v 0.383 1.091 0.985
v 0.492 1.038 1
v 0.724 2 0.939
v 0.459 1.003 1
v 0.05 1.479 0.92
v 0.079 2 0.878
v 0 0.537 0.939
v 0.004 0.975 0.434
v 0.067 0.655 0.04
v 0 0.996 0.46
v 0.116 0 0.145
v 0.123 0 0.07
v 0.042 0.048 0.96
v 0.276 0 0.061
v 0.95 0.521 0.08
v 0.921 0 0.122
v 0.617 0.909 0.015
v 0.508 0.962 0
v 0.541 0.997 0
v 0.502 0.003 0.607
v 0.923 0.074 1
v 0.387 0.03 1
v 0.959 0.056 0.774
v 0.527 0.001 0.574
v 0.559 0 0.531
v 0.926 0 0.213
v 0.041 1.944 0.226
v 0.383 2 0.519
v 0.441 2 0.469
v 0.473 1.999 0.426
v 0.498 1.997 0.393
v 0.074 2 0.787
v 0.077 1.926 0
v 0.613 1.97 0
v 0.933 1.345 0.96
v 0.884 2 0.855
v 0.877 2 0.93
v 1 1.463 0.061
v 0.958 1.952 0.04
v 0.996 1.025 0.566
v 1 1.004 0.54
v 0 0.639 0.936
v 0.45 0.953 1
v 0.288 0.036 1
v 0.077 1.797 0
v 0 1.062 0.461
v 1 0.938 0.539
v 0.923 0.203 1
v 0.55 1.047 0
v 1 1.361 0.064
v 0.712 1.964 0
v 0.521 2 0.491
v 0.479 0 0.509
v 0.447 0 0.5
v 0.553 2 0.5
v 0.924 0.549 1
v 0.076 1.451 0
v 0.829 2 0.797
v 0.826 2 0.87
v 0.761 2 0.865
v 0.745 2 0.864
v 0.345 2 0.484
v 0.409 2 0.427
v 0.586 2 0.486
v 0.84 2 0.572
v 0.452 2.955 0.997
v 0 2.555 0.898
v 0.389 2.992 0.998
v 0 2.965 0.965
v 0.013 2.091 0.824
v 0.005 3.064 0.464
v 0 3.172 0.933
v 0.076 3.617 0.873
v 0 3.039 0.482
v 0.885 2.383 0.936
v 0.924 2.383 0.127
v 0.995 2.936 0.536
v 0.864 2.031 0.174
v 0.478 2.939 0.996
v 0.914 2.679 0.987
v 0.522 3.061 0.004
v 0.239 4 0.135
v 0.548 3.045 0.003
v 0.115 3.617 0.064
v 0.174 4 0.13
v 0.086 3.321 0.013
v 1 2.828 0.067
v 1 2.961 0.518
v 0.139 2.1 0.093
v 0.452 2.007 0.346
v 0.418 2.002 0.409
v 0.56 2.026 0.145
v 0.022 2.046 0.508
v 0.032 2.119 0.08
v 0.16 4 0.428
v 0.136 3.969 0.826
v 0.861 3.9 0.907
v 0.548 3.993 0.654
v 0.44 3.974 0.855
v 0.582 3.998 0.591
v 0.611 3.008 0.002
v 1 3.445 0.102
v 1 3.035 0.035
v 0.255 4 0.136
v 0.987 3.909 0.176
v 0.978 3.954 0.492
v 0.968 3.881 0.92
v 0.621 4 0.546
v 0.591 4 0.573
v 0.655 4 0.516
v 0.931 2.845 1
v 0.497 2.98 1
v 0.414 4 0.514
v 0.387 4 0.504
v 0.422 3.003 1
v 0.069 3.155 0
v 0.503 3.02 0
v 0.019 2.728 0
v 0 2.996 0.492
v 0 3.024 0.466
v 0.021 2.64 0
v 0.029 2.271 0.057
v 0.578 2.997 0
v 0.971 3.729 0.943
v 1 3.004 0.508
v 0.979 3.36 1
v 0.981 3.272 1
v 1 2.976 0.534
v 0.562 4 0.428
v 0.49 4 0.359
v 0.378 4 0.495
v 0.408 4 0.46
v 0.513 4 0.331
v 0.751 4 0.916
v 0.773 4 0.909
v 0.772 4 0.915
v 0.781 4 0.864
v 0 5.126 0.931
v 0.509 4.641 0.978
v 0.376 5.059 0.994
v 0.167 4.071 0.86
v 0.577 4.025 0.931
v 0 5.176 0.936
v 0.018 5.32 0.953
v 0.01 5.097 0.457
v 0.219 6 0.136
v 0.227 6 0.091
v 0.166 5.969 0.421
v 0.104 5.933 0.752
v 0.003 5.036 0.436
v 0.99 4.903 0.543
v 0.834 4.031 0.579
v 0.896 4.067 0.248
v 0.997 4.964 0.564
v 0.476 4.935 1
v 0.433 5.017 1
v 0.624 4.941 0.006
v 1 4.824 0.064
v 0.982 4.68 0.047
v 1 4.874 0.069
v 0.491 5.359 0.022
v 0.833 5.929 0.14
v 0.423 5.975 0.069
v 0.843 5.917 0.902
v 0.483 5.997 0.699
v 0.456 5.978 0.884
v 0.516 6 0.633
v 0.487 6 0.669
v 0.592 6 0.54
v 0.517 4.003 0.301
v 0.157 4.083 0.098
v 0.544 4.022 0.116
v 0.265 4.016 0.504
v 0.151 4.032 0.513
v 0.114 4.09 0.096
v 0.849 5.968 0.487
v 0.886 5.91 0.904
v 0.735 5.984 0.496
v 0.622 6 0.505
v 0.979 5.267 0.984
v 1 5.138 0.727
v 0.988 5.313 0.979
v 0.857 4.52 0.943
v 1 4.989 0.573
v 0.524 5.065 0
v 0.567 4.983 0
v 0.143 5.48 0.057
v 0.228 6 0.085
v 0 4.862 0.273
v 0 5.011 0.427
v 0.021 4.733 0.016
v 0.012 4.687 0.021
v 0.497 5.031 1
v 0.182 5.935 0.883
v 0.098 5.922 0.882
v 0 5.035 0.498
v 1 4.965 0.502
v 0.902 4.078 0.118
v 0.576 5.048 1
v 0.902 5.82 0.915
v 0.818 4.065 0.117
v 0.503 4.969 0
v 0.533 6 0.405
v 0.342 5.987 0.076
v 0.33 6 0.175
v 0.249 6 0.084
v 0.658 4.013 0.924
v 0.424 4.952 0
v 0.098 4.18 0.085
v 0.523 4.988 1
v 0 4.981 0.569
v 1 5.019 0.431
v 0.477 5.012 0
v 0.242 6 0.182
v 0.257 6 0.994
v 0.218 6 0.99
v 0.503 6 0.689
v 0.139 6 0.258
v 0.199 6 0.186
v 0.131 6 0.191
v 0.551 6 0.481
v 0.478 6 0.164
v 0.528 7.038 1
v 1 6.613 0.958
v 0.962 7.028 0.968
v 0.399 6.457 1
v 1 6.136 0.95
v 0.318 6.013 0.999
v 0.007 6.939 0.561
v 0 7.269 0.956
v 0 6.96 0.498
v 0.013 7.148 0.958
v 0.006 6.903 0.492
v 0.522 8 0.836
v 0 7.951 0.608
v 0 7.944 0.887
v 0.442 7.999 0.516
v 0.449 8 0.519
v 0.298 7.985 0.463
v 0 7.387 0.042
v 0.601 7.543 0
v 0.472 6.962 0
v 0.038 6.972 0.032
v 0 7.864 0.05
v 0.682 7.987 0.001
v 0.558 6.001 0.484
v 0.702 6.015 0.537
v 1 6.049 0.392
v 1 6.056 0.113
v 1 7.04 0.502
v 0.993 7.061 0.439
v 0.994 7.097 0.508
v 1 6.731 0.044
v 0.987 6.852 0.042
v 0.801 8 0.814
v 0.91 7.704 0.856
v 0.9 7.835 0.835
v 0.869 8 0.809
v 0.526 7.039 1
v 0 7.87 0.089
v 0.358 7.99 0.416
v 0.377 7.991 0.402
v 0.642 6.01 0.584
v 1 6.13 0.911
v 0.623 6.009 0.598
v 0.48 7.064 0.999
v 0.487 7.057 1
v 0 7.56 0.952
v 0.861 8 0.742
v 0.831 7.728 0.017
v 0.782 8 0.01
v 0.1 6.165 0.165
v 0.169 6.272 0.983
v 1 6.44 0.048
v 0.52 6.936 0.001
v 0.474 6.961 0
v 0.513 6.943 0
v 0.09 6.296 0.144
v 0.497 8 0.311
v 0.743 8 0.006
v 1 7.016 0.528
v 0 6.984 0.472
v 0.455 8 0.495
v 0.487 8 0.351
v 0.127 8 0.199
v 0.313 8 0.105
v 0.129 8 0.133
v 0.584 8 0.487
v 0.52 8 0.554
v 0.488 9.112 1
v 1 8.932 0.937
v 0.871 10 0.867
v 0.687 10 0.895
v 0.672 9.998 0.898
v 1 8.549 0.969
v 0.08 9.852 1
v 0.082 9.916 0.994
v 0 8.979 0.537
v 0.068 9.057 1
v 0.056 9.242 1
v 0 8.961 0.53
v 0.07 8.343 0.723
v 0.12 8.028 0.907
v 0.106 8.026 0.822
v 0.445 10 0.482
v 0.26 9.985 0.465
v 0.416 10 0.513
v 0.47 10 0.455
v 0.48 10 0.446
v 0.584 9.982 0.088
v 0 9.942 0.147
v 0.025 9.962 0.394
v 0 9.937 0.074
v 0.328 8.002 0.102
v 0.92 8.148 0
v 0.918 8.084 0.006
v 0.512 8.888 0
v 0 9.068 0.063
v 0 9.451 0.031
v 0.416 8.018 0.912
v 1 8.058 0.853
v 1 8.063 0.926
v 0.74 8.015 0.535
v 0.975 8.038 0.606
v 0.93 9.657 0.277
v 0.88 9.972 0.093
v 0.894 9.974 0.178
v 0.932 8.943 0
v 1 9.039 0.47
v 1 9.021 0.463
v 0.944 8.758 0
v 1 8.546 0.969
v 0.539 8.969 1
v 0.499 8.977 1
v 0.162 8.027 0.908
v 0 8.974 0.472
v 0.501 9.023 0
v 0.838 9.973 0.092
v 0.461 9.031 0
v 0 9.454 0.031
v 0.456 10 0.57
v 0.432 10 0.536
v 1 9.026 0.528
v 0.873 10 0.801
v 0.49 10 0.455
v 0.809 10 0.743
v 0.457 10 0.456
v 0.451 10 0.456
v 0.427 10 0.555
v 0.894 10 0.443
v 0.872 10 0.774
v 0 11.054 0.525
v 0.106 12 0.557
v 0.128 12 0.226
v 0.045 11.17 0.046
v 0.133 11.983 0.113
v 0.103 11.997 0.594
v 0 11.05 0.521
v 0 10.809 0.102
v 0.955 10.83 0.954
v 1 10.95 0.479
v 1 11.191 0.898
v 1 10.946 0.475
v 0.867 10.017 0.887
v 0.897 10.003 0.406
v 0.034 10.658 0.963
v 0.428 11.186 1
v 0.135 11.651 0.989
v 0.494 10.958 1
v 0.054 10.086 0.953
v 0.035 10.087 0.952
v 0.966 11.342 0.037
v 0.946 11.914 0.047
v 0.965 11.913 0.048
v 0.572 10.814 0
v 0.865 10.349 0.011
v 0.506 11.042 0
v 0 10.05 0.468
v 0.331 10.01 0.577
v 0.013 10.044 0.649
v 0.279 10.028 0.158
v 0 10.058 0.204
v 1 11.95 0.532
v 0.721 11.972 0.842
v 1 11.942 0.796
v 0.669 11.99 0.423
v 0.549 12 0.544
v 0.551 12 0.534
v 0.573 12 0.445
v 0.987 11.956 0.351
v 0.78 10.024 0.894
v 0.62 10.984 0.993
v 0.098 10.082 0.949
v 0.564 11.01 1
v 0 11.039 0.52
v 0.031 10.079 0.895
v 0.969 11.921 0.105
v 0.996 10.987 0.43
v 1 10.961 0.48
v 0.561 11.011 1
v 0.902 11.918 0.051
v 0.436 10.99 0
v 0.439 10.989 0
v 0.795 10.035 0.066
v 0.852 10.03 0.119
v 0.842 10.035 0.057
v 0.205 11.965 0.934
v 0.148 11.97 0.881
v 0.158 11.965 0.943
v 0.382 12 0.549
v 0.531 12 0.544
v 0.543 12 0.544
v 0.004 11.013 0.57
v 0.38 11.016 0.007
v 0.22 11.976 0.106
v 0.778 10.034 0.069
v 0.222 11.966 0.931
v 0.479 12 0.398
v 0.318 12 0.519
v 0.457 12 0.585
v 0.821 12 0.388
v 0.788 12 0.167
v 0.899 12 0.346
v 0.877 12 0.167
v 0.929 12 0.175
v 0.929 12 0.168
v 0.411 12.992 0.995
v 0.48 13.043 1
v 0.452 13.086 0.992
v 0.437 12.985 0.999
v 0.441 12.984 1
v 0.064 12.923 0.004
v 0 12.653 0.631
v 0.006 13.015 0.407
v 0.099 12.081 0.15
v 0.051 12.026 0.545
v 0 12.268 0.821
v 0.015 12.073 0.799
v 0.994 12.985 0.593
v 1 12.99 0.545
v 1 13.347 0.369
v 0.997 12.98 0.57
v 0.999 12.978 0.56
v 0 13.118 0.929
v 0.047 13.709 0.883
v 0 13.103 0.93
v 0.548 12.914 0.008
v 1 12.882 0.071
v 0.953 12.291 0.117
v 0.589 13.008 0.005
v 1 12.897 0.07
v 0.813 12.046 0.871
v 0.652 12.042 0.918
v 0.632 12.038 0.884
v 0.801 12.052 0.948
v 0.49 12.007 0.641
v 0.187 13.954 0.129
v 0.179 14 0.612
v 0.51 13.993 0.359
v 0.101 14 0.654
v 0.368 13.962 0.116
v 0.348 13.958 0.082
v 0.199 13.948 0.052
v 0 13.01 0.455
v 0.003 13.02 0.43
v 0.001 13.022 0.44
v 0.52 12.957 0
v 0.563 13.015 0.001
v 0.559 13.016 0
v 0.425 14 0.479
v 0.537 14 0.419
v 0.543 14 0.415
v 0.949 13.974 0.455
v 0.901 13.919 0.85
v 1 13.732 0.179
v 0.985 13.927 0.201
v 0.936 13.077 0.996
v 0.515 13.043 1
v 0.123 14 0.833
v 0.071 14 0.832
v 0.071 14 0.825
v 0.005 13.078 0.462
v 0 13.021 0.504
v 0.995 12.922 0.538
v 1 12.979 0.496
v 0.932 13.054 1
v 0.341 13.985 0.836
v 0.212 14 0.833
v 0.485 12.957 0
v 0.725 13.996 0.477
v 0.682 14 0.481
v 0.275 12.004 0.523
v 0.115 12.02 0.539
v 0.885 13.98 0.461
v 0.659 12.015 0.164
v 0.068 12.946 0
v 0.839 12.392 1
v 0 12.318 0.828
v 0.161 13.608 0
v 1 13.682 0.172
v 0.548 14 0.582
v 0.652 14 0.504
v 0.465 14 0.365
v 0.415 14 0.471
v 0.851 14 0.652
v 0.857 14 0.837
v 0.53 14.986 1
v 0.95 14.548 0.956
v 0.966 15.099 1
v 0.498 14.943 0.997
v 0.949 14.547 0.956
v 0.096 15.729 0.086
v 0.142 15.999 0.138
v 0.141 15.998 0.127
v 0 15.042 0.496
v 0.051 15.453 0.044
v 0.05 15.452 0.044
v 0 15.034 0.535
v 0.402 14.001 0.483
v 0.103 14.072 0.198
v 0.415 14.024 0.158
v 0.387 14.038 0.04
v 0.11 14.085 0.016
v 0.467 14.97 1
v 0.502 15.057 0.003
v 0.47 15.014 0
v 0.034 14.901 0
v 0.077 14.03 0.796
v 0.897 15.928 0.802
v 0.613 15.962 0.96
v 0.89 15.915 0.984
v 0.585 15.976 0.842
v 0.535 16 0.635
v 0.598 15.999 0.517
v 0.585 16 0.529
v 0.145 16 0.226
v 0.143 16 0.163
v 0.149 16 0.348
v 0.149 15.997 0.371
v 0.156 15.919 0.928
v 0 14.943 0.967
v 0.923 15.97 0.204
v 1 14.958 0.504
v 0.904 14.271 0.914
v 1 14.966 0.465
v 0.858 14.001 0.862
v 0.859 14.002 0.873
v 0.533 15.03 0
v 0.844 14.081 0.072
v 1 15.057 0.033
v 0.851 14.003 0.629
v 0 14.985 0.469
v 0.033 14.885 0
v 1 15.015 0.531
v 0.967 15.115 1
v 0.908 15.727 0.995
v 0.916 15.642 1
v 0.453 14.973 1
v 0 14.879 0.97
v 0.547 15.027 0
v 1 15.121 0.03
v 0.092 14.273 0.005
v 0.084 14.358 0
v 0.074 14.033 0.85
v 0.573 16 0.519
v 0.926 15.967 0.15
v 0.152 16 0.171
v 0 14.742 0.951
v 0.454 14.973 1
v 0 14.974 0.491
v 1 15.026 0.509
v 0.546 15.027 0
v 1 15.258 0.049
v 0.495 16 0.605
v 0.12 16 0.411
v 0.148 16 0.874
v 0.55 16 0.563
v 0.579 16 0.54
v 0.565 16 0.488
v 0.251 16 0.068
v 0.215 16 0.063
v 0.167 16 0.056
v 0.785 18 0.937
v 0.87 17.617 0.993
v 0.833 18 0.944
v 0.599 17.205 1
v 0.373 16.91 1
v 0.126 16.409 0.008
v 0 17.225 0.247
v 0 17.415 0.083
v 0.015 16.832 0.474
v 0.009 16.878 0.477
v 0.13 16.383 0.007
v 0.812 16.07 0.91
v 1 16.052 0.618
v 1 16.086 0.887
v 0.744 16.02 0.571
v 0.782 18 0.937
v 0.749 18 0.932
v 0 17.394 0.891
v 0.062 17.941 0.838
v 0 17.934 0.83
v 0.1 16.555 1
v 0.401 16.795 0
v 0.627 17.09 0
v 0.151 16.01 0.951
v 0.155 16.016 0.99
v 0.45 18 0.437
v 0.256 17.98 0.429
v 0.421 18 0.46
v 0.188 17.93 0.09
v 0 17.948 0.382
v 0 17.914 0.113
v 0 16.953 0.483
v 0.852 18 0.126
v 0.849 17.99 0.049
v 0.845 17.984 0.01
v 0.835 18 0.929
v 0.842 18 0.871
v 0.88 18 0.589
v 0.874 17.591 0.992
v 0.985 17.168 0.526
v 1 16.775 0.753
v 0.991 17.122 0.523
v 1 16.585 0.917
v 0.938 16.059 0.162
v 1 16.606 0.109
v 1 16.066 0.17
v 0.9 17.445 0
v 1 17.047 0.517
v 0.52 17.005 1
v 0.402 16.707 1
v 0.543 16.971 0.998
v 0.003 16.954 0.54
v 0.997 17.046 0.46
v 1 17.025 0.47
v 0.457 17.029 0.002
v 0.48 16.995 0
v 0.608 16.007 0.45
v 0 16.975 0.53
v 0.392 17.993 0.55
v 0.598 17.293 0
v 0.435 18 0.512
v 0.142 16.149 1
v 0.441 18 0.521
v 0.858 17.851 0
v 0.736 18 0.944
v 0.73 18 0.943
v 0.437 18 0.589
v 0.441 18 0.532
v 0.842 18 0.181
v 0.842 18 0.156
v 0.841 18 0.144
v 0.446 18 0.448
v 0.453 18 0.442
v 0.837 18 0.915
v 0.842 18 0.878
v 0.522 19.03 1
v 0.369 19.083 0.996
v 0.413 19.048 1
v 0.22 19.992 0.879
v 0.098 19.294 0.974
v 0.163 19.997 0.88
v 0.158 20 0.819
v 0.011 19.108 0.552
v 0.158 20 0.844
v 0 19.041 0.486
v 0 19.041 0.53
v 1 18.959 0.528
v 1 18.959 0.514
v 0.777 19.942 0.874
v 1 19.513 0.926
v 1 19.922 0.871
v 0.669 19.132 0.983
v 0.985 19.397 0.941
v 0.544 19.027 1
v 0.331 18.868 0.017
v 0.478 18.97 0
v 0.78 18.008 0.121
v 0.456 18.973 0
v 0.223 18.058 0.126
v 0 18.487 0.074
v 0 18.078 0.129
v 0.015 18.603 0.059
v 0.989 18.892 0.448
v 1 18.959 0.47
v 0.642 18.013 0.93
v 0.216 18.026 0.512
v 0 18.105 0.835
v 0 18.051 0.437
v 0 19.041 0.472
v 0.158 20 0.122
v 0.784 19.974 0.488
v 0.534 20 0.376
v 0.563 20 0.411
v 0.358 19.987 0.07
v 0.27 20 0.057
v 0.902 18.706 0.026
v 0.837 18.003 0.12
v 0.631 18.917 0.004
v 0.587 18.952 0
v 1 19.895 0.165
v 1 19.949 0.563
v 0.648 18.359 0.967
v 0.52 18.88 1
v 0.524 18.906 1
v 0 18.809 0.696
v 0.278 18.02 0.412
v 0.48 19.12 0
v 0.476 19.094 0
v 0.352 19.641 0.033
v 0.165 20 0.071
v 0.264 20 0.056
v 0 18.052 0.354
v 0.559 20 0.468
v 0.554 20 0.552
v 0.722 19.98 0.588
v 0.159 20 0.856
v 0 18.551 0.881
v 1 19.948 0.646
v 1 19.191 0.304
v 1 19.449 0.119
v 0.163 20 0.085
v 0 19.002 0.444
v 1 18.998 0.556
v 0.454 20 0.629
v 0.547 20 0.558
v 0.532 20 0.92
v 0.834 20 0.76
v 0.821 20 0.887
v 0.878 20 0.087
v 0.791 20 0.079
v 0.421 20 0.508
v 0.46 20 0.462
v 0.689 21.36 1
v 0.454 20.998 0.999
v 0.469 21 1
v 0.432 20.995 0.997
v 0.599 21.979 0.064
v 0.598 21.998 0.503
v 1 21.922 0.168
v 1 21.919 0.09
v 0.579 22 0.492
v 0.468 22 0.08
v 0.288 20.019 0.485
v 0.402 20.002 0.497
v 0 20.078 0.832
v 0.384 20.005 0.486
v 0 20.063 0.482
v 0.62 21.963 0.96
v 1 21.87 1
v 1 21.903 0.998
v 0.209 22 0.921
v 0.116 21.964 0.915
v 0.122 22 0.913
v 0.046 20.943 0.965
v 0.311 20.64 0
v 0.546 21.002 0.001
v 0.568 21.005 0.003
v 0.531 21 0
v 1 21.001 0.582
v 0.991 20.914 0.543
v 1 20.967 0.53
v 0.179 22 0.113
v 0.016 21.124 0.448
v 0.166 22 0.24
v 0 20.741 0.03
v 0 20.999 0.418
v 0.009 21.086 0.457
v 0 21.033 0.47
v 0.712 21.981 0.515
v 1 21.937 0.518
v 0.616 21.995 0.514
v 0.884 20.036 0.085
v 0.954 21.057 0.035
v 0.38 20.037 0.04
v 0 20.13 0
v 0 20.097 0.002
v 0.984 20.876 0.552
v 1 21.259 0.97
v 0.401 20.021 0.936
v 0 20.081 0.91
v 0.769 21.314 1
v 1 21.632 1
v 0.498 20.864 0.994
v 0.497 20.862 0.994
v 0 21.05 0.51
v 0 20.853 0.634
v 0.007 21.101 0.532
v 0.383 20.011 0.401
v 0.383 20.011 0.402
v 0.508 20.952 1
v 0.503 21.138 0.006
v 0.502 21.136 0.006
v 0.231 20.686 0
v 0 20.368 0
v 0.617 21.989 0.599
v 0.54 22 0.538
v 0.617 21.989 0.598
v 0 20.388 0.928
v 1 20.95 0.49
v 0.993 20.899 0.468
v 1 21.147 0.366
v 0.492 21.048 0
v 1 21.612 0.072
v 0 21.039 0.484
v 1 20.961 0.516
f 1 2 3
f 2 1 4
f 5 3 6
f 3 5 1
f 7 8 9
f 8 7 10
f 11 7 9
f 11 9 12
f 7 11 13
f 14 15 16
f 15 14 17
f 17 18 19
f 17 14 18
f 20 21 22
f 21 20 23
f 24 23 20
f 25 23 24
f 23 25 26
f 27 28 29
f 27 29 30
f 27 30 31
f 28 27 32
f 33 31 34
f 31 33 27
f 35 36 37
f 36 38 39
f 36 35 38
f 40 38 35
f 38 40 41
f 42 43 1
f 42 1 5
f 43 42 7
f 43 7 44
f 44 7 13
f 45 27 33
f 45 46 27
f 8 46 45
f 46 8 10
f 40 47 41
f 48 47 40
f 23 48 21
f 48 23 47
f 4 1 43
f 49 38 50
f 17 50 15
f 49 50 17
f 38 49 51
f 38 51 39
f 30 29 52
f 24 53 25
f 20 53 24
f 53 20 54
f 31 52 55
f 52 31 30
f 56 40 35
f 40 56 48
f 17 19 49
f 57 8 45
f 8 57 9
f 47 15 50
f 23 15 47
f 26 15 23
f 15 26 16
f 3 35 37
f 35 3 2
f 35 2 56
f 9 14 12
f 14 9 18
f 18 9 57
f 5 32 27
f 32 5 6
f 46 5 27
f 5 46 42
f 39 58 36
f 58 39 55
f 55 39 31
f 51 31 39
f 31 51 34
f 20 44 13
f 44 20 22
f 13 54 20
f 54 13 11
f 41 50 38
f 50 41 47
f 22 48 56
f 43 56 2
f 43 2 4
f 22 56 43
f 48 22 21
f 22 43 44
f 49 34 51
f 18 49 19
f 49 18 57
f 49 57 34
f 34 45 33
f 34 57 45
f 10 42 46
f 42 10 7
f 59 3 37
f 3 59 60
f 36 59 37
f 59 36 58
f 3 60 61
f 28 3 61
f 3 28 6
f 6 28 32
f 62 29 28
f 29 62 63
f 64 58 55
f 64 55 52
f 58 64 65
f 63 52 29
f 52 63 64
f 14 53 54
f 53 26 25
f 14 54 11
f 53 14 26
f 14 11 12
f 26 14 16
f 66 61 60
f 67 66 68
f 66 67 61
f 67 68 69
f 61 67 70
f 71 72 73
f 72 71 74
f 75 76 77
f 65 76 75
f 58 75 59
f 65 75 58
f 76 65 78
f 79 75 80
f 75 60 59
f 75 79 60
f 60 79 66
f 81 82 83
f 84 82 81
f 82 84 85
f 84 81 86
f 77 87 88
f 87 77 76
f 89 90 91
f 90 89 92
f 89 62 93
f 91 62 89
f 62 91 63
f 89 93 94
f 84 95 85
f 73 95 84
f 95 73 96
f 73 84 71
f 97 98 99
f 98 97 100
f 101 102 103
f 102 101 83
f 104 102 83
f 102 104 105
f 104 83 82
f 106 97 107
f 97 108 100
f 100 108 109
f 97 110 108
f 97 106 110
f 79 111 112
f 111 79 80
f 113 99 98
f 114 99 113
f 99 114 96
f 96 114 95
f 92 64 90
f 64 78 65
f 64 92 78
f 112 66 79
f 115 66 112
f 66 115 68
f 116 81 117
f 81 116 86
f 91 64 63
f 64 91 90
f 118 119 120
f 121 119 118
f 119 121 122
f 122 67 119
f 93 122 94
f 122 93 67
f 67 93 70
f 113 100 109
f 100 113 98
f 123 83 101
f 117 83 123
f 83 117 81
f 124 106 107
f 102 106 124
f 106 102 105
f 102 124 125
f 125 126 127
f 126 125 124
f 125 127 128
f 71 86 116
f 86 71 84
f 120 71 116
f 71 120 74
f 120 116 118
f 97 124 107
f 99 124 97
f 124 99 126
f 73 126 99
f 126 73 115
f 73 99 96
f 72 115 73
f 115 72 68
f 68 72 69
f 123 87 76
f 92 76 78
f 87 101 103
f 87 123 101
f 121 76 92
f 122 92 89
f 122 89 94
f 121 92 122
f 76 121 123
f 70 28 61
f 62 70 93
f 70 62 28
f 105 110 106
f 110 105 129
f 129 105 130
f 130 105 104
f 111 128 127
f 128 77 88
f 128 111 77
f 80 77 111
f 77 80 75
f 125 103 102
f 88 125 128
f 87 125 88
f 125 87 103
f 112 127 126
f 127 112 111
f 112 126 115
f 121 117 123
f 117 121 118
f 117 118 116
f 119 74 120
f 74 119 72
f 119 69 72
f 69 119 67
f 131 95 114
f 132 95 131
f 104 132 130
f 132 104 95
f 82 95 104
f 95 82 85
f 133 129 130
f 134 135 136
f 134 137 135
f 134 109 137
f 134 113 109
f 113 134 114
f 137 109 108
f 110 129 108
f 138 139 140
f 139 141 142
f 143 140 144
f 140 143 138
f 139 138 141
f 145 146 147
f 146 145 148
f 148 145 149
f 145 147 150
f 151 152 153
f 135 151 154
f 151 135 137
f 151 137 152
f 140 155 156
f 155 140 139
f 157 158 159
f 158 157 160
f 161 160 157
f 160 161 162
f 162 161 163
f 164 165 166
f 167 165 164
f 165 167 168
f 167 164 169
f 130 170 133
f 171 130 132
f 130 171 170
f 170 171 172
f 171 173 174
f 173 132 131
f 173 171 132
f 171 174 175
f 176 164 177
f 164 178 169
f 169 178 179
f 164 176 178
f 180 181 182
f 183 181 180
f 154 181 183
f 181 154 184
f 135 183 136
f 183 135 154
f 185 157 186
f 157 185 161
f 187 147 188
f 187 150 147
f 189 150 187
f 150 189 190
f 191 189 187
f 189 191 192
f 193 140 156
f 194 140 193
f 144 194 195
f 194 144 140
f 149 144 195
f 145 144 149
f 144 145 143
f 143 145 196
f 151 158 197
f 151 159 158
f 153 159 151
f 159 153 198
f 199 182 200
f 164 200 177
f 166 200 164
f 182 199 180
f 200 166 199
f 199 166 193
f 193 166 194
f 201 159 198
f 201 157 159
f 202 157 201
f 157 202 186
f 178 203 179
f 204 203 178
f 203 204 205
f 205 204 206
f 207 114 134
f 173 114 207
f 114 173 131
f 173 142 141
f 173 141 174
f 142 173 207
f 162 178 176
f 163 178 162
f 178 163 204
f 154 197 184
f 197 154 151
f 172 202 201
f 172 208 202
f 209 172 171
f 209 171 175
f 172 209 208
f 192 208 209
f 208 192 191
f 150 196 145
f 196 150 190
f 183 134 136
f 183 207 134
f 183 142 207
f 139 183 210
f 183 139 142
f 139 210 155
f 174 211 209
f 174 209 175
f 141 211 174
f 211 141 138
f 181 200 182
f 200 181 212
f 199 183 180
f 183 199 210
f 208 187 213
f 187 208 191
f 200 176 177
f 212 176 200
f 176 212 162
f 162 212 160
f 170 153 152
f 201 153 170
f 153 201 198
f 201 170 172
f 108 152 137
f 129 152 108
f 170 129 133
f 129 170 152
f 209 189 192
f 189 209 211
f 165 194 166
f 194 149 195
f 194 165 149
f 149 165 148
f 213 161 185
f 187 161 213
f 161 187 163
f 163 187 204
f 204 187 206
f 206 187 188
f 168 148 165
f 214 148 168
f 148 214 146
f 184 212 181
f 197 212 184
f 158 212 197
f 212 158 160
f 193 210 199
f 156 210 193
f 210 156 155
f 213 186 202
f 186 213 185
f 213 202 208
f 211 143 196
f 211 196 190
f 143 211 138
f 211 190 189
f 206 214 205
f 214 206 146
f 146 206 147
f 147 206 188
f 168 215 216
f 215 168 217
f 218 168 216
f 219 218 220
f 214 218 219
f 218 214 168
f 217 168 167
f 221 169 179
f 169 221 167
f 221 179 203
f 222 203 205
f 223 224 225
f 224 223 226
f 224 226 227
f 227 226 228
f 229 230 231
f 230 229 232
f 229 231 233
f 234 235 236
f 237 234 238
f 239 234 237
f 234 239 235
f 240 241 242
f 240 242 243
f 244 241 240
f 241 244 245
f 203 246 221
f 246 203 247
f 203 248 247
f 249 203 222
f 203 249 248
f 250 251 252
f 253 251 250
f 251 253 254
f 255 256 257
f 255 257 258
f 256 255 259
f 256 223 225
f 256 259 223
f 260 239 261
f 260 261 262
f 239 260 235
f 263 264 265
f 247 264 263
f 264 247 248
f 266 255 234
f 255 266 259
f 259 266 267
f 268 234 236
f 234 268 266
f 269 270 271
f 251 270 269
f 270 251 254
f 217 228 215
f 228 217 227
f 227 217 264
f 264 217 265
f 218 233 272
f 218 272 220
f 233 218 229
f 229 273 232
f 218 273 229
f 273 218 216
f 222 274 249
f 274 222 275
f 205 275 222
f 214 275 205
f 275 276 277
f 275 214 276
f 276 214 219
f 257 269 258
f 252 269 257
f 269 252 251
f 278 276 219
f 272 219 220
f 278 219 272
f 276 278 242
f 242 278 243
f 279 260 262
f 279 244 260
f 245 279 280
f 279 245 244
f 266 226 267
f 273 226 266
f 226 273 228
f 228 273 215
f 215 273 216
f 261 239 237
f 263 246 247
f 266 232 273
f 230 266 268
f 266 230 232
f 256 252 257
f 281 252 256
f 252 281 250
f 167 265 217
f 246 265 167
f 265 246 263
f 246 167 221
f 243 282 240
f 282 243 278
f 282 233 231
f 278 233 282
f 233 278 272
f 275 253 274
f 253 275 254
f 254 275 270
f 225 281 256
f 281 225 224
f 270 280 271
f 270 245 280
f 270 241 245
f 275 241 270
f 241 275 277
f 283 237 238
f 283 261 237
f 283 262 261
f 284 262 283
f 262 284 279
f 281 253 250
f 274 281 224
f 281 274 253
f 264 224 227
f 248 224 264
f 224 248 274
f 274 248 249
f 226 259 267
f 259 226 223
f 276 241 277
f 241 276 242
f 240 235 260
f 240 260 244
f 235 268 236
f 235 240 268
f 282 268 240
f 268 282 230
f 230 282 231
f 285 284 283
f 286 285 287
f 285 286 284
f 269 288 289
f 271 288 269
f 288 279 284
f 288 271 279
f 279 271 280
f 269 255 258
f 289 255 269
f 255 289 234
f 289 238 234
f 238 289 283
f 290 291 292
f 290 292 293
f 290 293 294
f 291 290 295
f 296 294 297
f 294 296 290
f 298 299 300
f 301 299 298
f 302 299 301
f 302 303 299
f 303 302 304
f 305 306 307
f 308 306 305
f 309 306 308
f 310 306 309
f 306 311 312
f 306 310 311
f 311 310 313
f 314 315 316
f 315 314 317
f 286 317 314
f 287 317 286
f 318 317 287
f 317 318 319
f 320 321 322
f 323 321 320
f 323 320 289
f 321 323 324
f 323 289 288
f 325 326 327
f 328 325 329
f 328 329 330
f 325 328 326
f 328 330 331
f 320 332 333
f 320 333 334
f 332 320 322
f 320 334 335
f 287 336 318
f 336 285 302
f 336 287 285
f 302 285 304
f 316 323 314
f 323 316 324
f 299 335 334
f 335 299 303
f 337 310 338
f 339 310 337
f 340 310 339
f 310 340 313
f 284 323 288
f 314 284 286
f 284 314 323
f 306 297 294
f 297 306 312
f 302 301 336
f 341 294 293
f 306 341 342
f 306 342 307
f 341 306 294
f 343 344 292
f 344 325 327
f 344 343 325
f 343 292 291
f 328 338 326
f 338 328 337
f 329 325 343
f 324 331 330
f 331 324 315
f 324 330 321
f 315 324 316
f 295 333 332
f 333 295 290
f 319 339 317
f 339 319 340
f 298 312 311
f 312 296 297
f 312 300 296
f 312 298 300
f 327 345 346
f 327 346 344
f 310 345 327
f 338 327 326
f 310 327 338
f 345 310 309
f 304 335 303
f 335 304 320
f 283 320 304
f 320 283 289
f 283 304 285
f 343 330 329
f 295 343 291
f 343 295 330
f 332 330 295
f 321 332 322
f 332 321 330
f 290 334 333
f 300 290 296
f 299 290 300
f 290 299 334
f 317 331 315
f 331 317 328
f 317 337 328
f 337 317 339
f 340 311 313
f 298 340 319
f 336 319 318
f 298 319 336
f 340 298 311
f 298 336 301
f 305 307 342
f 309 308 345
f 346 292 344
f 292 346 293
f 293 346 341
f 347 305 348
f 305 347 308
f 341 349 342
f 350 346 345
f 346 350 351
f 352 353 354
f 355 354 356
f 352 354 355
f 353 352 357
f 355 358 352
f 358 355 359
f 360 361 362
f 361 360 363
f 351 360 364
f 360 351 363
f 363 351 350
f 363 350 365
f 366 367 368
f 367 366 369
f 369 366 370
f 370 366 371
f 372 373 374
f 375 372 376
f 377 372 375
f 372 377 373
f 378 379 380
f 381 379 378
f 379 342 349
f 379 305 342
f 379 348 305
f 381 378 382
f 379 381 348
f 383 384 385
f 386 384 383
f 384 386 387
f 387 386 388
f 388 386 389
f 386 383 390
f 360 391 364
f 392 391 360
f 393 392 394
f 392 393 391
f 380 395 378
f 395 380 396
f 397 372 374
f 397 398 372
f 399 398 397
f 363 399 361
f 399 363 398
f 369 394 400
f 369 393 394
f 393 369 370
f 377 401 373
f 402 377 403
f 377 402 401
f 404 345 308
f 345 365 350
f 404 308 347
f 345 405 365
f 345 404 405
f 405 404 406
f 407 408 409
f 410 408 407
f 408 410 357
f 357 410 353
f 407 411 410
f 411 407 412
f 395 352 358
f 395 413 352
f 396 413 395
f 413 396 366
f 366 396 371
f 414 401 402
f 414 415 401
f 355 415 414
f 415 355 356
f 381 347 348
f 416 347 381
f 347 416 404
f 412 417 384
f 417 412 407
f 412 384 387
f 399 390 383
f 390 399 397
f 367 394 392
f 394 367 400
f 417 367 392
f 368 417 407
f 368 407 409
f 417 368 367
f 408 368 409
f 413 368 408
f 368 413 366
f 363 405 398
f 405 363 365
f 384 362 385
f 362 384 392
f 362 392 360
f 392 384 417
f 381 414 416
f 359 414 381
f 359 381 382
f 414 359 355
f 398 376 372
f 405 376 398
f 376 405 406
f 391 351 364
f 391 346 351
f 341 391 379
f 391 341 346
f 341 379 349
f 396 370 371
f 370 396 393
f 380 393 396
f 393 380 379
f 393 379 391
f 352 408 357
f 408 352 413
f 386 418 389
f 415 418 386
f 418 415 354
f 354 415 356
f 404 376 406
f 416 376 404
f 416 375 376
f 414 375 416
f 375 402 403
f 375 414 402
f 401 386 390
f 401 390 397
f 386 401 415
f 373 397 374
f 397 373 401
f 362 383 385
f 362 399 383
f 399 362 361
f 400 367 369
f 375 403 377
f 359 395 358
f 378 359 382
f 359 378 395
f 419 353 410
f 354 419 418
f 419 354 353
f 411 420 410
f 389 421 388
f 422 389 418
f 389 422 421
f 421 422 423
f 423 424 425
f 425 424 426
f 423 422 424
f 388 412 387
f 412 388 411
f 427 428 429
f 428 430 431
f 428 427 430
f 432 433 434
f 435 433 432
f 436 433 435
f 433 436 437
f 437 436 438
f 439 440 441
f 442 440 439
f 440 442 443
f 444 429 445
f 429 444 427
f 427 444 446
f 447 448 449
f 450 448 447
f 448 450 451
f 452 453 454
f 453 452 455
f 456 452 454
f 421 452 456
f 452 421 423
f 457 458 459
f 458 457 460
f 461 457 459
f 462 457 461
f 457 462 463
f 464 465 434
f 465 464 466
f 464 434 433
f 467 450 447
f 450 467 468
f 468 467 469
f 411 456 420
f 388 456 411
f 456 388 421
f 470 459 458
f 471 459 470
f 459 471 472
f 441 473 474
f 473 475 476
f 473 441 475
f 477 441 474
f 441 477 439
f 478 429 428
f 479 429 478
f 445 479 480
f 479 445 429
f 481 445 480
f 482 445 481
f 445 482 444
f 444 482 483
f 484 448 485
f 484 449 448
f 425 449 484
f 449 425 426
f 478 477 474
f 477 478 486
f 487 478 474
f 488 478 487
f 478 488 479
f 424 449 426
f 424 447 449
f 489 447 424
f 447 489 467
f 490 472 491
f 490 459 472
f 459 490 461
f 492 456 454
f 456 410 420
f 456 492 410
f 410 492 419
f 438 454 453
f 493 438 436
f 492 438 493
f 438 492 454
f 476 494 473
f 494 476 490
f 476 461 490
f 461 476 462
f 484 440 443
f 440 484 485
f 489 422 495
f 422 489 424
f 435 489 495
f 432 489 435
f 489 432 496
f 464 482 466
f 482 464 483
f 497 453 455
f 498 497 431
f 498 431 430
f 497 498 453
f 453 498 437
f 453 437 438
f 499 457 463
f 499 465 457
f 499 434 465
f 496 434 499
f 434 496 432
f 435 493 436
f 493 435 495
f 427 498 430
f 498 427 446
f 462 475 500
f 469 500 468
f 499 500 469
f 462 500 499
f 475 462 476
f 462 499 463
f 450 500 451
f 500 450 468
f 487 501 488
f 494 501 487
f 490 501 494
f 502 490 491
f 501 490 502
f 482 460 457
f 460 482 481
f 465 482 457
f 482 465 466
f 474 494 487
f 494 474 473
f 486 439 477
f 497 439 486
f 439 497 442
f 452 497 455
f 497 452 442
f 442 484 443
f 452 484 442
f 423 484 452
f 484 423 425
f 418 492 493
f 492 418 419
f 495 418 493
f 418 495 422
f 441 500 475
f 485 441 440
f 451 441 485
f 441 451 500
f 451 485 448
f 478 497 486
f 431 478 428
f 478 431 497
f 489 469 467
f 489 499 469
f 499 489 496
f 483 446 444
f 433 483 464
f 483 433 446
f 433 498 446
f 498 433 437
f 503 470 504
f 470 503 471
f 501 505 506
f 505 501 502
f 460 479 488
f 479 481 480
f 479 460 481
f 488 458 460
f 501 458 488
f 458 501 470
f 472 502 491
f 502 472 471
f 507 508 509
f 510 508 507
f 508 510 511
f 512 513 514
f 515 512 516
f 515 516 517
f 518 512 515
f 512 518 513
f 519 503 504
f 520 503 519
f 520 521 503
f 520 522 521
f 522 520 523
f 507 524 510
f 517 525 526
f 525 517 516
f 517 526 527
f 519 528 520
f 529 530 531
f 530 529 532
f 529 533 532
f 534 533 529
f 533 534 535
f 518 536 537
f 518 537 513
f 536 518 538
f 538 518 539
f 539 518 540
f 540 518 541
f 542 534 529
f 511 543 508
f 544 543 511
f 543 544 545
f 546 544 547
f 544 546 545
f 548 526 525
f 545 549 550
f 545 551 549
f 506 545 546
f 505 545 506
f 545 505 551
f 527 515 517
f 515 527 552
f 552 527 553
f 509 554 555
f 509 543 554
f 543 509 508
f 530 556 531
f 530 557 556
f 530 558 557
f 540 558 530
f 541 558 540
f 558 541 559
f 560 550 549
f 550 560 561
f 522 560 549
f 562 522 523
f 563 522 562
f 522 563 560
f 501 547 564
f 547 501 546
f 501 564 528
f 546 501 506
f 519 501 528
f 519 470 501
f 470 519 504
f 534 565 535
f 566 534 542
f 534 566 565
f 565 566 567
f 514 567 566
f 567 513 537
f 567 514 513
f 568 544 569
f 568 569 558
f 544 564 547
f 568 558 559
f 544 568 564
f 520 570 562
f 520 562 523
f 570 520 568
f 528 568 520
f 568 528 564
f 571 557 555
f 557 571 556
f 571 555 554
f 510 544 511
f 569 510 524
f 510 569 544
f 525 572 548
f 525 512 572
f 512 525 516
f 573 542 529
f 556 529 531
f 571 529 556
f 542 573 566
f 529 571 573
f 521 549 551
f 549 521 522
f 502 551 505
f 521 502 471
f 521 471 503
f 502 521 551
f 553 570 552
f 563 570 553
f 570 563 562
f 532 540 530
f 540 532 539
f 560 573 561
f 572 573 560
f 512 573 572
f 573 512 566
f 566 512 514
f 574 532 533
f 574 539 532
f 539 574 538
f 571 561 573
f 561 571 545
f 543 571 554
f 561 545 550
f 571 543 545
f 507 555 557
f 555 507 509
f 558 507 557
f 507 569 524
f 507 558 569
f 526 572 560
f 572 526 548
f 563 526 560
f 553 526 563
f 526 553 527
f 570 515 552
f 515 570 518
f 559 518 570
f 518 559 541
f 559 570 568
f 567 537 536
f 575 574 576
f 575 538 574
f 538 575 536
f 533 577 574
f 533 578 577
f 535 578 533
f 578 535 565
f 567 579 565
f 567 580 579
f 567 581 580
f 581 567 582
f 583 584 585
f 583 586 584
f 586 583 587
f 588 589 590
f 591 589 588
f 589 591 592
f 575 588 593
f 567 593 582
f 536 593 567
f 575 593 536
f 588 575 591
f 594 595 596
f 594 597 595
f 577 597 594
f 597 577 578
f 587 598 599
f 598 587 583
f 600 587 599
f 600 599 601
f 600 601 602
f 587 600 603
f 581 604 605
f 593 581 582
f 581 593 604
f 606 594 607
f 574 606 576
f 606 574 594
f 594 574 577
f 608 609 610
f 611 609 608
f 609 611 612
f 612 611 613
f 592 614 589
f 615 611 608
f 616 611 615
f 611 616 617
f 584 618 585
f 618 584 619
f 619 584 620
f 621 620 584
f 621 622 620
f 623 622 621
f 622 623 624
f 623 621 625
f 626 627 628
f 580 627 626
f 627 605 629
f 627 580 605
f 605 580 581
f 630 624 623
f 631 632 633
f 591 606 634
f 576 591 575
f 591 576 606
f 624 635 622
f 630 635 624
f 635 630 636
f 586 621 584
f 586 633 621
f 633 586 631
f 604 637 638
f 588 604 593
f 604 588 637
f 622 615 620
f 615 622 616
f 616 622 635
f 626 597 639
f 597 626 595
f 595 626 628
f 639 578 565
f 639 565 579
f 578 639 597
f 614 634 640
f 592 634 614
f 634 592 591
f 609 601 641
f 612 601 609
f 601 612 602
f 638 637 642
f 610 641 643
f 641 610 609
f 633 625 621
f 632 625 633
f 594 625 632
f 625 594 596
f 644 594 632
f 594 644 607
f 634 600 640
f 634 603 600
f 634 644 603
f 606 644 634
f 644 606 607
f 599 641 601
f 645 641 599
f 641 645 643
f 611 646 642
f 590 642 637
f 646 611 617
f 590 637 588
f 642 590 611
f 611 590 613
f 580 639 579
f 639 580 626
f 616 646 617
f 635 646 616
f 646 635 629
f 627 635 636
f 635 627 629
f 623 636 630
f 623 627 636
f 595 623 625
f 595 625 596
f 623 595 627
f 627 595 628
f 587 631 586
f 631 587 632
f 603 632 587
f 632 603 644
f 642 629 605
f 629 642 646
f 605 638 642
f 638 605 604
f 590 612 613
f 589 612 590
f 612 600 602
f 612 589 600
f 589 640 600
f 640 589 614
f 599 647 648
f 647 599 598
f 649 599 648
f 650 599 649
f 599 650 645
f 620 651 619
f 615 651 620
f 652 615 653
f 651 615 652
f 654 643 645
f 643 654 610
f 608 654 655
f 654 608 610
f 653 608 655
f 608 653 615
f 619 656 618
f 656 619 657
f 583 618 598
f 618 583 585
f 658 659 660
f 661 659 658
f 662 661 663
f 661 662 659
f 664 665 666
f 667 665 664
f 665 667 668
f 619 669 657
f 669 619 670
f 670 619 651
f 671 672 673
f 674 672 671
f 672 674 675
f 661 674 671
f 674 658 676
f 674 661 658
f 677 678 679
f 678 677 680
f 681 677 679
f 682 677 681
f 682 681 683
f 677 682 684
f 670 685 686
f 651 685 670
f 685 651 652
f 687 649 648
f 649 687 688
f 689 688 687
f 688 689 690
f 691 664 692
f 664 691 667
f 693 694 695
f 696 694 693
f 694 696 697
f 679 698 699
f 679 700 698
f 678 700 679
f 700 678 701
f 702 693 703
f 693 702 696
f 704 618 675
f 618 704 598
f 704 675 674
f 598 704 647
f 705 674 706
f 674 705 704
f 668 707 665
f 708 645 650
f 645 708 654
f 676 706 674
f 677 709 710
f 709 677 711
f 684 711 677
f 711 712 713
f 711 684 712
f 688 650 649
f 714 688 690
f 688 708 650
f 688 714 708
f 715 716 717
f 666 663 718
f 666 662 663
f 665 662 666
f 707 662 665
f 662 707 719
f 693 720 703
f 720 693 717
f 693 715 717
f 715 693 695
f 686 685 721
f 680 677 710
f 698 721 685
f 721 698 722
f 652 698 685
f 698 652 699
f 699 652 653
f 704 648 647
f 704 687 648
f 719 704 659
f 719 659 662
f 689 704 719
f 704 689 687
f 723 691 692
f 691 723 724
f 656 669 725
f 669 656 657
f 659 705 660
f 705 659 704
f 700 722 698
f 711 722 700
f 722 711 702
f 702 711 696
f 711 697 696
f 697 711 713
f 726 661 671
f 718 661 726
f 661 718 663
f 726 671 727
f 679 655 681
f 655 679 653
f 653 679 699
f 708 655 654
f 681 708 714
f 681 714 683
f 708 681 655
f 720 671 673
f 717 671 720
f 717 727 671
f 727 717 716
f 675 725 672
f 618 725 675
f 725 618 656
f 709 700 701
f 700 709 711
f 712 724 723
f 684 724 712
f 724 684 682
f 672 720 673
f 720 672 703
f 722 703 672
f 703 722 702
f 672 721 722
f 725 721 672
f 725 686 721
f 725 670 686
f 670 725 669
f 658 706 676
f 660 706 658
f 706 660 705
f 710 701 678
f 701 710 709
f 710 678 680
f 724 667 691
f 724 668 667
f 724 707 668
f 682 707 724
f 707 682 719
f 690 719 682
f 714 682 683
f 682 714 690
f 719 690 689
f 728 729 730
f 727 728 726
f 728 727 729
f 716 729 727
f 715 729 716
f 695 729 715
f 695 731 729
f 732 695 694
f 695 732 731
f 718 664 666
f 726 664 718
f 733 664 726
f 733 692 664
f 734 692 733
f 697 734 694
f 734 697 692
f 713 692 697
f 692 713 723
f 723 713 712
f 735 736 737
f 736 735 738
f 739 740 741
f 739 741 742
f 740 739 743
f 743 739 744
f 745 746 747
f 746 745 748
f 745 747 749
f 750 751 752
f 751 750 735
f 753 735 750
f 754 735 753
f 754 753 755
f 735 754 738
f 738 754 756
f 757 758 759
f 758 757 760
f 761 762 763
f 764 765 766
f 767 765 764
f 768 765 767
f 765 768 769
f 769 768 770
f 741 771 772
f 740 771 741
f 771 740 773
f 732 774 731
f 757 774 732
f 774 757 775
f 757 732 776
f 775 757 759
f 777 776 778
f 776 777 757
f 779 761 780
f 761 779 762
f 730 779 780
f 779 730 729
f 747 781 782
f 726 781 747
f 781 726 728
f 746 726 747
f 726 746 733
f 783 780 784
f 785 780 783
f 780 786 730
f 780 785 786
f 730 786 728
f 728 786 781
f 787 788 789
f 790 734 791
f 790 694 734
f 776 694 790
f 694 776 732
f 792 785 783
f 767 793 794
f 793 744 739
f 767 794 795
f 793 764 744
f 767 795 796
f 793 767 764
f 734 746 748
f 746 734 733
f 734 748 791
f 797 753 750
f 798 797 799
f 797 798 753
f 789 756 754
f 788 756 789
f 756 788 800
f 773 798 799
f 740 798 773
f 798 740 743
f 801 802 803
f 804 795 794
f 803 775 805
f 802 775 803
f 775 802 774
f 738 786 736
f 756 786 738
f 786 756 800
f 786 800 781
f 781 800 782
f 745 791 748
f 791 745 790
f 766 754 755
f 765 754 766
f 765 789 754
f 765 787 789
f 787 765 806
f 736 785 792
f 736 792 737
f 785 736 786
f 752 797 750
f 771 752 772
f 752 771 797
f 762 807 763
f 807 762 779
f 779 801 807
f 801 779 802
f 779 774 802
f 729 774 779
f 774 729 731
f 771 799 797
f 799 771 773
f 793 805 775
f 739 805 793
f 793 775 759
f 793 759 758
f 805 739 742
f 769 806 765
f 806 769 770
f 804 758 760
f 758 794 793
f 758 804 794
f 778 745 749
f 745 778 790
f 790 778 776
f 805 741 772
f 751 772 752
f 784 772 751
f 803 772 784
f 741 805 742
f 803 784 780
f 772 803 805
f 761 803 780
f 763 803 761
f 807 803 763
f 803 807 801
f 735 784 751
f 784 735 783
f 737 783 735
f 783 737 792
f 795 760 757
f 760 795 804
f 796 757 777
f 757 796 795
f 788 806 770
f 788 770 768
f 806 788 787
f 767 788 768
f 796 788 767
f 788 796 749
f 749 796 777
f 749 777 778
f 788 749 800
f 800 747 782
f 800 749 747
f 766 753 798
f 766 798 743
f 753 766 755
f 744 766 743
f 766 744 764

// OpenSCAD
// file: brick_generic.scad
// ==============================================
// = Generic Brick                              =
// = Jacob Loss                                 =
// = 02/12/2022                                 =
// = GNU GPLv3.0                                =
// ==============================================

// Generic Brick to be used as a template for the future
module brick_generic(
    size,
    rand = true,
    seed
    ){

    // Undefined global protection
    // These only sometimes work?
    size = is_undef(size) ? $bs     : size;
    seed = is_undef(seed) ? $seed   : seed;
    
    r       = 1;
    r_min   = 0;
    r_max   = 1;
    r_val   = rands(r_min, r_max, r, seed);

    if($d){                                                 // Debug mode (just a cube)
        cube(size);
    } else {                                                // Run mode 
        intersection(){
           
            union(){                                        // Where the magic happens
                r_size = rand ? size * r_val[0] : size;     // Randomly scale brick [0, 1]
                cube(r_size, center=false);
            }

            cube(size);                                     // Cut brick so it is always smaller than size
        }        

    }
}

module _OSBK_test_suite(){
    $d = false;
    $bs = [1, 2, 1];
    r_vals = rands(0, 10000, 11, 1234);
    
    for(i = [0 : 10]){
         
        $seed = r_vals[i];
        
        translate([0, i * 2, 0])
        children(0);
    }

}

module _OSBK_test_brick_generic(){
    _OSBK_test_suite()
    brick_generic();
}
_OSBK_test_brick_generic();
// main file
// ==============================================
// = Intersected Bricks                         =
// = Jacob Loss                                 =
// = 02/12/2022                                 =
// = CC BY-SA 3.0                               =
// = Remixed from:                              =
// = https://www.thingiverse.com/thing:219574   = 
// ==============================================

// Get generic brick (mostly for the test suite)
use <brick_generic.scad>

// Intersection Bricks
module brick_inter(
    size,
    seed,
    max_a   = 10,
    n       = 3,
    ){

    // Undefined global protection
    size = is_undef(size) ? $bs     : size;
    seed = is_undef(seed) ? $seed   : seed;
    
    z = rands(-1, 1, n * 3, seed);

    if($d){
        cube(size);
    } else {
        intersection(){
            
            translate(size / 2)
            intersection_for(i = [0:n-1]){
               
                //echo("i =", i);
                // echo("z =", z);
                //echo("max_a =", max_a);
                
                rotate([
                        max_a * z[3 * i + 0],
                        max_a * z[3 * i + 1],
                        max_a * z[3 * i + 2],
                       ])
                cube(size, center=true);

            }

            cube(size);
        }        

    }
}

module _OSBK_test_brick_inter(){

    _OSBK_test_suite()
    brick_inter();
 
}
_OSBK_test_brick_inter();
